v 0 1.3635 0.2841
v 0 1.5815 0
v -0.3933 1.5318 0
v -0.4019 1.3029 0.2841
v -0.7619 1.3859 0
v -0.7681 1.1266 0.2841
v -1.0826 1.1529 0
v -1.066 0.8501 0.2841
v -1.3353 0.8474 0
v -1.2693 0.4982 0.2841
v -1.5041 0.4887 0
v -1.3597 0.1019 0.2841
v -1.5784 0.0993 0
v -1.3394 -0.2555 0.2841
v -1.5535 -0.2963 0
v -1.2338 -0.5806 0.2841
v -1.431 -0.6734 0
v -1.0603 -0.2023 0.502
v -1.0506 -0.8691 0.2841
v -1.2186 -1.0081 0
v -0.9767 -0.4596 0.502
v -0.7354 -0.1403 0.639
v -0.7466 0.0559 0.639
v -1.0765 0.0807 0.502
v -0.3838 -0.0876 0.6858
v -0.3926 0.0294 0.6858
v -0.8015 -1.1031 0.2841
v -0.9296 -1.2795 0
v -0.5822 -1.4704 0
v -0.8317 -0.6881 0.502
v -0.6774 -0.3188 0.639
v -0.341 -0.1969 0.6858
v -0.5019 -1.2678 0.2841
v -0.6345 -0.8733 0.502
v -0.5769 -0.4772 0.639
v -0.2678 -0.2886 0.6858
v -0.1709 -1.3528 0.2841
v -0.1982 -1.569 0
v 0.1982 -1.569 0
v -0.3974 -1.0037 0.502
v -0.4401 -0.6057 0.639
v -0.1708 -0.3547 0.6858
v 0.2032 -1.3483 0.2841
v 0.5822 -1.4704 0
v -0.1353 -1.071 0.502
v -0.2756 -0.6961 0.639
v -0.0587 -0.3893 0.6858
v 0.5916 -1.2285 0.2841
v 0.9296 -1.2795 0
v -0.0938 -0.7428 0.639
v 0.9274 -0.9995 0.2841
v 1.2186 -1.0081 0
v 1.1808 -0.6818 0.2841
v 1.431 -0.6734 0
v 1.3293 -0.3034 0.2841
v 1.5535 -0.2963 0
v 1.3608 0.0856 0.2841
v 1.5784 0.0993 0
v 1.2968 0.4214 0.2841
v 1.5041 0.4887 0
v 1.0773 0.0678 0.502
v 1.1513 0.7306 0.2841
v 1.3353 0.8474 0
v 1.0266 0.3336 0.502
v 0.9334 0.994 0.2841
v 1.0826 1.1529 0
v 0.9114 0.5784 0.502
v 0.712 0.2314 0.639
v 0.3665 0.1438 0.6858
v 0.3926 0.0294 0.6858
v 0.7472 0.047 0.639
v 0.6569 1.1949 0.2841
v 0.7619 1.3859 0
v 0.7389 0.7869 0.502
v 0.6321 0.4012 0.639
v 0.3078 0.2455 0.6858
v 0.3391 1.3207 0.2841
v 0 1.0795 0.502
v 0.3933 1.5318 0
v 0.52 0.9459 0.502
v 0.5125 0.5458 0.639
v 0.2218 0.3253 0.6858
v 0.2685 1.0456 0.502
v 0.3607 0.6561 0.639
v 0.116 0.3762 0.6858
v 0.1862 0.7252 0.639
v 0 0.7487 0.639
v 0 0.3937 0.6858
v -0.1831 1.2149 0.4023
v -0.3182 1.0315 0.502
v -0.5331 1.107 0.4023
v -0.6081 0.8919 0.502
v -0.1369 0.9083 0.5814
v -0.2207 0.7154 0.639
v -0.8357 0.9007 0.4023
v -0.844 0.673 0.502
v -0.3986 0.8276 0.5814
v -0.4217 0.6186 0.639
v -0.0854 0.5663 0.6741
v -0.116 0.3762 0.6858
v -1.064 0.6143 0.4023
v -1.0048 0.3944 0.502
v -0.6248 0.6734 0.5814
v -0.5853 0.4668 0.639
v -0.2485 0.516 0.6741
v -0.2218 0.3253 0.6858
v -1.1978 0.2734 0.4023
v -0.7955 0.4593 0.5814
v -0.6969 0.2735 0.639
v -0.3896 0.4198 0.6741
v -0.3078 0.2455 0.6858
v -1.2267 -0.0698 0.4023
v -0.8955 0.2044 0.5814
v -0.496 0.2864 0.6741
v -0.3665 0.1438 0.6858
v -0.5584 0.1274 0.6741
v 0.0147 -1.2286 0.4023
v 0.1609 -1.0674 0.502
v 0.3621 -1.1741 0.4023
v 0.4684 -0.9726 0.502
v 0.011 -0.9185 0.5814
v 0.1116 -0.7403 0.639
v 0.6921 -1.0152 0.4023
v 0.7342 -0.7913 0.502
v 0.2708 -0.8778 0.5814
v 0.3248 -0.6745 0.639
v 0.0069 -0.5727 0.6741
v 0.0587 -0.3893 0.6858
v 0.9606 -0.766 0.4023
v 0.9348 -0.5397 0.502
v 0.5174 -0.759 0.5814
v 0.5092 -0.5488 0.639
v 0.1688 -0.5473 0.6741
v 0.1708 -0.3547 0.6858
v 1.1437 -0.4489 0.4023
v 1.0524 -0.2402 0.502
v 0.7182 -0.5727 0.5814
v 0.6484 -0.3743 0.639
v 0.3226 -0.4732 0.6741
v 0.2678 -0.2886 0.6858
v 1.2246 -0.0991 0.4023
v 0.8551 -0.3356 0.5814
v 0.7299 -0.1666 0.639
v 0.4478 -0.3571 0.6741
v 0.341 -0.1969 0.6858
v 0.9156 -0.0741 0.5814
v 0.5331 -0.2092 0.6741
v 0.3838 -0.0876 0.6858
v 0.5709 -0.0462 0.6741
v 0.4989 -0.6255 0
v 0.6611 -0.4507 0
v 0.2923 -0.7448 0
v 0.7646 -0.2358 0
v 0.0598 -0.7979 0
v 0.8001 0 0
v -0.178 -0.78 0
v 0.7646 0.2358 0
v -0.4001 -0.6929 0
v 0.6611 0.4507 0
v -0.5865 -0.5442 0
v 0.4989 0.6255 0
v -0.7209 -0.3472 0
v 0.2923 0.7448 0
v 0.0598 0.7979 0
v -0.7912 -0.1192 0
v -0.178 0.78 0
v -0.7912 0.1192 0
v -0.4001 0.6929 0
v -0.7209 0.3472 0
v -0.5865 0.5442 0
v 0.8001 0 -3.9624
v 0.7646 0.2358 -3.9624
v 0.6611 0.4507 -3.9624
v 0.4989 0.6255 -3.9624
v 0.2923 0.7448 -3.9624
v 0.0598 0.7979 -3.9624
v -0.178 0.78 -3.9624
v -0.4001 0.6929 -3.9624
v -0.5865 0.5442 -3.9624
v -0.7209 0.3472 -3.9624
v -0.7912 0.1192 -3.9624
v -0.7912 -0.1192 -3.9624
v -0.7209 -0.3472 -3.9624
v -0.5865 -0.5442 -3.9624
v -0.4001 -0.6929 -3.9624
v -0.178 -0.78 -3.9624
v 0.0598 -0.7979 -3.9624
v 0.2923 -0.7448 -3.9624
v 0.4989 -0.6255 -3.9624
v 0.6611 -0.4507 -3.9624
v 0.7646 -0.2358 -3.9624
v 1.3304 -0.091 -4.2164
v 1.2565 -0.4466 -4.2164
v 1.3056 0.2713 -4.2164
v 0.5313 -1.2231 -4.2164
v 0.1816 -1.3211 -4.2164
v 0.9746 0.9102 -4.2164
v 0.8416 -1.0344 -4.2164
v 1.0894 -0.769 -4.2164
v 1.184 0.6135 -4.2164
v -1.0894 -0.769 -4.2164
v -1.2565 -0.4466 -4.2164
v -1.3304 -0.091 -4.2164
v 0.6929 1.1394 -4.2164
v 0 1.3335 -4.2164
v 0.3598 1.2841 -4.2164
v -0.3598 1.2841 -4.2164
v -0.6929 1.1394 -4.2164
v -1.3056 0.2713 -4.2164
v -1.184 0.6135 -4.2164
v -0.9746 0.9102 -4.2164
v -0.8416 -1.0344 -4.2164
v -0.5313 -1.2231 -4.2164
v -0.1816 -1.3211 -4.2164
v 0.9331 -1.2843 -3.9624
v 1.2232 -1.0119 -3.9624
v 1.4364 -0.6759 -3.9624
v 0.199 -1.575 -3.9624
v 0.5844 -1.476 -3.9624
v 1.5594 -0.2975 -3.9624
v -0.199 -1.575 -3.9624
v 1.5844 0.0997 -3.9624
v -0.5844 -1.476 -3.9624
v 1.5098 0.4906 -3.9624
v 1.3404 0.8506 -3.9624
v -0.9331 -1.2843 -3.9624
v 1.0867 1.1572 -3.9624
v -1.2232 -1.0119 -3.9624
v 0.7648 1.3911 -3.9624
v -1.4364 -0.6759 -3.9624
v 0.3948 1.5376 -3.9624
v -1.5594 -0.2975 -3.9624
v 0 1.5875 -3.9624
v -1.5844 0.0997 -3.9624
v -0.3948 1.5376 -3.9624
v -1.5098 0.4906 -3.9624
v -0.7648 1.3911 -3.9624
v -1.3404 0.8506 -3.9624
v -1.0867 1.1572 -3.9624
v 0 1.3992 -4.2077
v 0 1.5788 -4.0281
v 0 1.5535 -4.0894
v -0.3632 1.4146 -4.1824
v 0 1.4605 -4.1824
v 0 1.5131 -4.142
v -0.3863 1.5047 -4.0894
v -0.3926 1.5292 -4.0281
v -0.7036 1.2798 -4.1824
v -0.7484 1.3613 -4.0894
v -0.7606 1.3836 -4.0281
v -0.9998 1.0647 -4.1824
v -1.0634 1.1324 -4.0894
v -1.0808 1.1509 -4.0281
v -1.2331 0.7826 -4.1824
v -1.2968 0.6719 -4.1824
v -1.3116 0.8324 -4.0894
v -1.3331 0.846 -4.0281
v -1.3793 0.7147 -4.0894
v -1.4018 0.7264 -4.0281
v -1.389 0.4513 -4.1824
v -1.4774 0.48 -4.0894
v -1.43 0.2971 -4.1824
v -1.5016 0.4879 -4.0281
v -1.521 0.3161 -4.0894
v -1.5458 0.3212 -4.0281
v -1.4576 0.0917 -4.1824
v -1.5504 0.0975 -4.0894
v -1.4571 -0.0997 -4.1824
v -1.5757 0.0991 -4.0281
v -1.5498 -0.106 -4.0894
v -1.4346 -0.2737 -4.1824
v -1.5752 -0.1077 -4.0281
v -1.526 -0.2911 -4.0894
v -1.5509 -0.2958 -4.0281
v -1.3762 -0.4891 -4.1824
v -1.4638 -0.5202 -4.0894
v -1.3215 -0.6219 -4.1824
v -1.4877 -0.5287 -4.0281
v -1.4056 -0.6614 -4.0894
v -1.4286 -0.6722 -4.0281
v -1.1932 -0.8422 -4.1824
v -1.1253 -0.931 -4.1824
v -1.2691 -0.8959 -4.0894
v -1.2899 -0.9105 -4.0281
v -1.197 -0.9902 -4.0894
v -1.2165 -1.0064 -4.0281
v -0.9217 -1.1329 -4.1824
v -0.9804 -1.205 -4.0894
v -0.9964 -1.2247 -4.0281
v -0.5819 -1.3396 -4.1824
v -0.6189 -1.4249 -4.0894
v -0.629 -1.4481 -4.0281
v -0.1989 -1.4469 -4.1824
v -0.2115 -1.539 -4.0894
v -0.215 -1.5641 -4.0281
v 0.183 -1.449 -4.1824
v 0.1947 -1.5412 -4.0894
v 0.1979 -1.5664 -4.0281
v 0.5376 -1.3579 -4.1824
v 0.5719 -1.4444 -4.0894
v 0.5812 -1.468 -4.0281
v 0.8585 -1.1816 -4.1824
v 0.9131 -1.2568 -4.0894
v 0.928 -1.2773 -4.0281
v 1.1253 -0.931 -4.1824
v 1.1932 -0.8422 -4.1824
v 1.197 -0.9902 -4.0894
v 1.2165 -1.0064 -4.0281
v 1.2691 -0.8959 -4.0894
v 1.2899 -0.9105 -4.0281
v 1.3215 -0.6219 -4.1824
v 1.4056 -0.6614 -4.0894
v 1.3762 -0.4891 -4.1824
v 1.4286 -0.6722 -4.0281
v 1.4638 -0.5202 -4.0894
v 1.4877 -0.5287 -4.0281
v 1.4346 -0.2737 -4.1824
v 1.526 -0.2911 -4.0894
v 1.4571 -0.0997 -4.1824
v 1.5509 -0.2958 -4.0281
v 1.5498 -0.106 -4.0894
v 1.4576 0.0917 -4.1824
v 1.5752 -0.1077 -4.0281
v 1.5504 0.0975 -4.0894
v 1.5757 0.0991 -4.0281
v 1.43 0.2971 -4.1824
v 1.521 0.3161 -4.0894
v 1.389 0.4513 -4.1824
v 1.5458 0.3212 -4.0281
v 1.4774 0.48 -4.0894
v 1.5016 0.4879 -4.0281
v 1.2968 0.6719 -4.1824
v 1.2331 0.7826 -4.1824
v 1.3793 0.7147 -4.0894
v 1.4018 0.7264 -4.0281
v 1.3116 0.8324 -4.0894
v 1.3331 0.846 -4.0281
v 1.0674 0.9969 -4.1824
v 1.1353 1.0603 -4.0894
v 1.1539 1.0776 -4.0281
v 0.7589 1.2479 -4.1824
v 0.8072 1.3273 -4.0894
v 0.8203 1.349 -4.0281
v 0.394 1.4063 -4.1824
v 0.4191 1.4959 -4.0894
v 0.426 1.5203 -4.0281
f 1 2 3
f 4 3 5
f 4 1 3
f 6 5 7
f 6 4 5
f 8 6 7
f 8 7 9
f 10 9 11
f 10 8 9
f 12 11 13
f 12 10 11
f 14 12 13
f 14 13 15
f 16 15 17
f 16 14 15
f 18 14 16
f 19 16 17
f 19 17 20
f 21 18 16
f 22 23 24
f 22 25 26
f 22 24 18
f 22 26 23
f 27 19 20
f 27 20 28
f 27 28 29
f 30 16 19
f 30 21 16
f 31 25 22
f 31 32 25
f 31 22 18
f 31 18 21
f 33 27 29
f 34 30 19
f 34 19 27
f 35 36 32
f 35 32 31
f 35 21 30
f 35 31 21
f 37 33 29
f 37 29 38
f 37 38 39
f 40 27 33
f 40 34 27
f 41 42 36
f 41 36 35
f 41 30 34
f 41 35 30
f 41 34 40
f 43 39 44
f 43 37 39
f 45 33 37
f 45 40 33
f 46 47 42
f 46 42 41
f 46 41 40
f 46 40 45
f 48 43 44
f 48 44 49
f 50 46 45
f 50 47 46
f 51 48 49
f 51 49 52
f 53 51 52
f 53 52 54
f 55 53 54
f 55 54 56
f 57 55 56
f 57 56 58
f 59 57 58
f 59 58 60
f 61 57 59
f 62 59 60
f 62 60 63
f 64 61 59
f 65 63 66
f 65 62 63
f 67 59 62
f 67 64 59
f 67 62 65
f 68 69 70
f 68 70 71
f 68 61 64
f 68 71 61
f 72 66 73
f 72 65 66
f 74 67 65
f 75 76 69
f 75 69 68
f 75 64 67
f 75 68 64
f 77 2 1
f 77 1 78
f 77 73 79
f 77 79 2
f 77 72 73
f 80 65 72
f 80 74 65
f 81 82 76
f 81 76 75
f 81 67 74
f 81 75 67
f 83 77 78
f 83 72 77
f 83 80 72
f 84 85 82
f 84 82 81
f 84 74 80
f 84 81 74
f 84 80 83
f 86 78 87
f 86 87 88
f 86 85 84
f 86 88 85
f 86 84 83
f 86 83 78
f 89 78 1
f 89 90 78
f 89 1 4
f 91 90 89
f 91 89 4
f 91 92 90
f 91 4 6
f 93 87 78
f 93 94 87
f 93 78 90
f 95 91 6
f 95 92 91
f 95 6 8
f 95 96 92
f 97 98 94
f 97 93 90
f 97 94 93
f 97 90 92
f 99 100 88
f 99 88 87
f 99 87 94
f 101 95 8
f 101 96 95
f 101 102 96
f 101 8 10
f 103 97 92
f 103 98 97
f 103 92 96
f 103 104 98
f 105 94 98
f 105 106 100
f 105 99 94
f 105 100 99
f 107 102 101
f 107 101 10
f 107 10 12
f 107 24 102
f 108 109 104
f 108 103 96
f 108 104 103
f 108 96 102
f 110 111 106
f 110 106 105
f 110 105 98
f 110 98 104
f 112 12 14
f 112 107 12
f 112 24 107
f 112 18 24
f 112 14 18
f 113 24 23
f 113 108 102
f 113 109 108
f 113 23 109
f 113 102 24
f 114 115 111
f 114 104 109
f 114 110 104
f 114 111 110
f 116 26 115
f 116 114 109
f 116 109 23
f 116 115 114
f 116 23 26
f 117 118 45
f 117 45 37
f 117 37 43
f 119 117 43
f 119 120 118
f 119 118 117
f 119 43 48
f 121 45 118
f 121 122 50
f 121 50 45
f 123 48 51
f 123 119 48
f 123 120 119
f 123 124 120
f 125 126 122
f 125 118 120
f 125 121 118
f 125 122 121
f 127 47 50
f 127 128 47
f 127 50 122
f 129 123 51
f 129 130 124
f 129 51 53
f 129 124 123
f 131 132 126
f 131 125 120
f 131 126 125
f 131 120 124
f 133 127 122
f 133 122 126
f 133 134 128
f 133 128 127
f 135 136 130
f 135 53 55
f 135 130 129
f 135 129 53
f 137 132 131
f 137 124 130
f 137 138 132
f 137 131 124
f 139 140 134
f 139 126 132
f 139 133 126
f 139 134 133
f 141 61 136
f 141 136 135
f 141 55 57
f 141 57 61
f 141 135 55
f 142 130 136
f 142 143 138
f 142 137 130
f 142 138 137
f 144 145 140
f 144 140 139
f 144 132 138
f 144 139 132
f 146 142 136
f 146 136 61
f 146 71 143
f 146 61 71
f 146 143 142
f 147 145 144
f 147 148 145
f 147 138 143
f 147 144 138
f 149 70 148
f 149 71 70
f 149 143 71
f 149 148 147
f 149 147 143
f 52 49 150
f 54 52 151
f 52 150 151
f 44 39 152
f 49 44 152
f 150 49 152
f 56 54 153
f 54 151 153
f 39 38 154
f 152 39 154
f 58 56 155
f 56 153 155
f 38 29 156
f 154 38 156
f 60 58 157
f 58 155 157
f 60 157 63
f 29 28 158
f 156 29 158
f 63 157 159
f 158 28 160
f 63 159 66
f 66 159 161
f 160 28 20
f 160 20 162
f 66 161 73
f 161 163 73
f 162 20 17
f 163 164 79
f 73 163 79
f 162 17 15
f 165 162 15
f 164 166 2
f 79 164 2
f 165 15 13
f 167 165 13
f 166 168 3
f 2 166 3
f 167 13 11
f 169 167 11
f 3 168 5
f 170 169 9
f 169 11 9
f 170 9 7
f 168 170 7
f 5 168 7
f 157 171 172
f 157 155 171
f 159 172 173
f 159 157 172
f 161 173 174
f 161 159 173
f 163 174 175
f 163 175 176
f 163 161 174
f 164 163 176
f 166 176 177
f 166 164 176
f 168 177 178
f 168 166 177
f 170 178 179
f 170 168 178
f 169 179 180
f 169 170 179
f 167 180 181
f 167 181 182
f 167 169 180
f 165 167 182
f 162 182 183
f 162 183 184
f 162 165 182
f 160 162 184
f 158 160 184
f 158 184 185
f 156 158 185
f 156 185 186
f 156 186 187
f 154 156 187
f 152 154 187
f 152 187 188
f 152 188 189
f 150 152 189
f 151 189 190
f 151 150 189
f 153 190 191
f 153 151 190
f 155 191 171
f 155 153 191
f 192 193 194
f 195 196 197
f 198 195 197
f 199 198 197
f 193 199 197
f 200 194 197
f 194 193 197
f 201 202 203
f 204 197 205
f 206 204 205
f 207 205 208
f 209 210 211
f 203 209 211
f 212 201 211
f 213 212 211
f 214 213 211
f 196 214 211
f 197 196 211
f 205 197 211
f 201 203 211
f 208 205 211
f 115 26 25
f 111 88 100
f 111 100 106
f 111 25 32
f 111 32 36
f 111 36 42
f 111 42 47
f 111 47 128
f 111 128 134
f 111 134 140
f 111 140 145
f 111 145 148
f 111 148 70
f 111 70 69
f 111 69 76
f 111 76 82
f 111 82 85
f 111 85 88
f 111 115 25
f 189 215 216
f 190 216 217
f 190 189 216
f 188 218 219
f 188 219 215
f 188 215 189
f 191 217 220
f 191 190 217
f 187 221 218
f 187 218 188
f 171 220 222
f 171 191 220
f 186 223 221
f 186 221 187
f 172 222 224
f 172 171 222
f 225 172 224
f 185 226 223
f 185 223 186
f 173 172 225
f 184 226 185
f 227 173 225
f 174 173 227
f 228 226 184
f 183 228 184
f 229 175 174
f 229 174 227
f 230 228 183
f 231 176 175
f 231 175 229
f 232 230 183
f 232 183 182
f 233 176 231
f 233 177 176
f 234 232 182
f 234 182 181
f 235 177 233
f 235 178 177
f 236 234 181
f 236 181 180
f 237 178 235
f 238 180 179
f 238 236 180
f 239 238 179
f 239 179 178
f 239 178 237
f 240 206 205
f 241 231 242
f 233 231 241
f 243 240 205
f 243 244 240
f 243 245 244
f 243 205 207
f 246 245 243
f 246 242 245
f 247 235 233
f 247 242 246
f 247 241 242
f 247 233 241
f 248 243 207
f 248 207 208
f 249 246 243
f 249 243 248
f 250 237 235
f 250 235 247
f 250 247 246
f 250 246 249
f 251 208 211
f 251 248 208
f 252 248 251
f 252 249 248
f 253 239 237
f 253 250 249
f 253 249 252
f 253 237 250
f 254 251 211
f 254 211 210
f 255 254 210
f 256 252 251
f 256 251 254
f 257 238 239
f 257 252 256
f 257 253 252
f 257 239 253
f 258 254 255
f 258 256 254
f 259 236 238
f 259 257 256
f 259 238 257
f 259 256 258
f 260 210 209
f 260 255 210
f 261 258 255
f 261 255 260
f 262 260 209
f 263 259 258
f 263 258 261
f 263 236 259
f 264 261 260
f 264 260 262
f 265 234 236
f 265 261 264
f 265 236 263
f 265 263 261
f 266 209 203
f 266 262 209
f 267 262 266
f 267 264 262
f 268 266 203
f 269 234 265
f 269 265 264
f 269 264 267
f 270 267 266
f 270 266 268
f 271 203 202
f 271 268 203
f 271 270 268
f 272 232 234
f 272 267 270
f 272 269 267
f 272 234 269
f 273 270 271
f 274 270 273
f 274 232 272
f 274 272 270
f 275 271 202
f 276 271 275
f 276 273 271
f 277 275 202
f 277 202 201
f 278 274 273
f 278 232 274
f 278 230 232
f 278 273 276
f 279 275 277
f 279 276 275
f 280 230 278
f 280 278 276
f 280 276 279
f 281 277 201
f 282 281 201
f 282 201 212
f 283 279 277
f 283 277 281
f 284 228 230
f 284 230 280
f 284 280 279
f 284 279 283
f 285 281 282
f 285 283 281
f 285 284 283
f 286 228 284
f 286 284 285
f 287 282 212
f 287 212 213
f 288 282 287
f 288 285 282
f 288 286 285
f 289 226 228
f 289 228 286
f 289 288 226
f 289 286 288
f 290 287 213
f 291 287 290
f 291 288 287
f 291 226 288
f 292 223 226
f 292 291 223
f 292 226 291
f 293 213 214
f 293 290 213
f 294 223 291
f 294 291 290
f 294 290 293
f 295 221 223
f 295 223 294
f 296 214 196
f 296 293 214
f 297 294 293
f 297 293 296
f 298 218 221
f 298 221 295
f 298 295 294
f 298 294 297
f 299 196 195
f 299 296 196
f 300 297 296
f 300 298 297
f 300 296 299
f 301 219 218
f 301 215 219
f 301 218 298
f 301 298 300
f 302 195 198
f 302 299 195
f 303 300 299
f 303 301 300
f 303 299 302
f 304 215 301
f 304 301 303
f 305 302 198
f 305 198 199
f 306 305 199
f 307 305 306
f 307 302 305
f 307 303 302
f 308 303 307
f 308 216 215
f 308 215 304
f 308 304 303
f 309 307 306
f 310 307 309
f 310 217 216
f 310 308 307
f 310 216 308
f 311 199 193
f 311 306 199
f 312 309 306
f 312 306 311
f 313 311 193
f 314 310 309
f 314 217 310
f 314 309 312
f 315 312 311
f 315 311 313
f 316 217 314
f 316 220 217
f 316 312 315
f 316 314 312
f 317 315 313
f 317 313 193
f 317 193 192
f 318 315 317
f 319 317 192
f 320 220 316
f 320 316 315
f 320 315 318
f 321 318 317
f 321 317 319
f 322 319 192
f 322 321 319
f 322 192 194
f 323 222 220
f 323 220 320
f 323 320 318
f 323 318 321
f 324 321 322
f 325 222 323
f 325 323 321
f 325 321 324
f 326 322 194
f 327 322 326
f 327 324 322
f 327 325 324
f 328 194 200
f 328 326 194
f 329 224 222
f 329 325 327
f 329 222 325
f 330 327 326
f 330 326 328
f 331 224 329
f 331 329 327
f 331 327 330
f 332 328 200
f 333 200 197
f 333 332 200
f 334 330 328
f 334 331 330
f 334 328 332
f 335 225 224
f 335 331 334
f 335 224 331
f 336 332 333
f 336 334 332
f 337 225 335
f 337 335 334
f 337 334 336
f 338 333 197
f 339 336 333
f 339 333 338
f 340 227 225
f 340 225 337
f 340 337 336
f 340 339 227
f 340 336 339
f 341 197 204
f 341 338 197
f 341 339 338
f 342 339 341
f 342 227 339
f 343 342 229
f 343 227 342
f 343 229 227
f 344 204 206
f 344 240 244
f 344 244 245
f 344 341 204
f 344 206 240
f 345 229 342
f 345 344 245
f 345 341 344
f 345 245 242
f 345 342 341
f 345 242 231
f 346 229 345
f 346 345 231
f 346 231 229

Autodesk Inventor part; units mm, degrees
ref_plane "YZ Plane" through (0, 0, 0) normal (1, 0, 0) x (0, 1, 0)
ref_plane "XZ Plane" through (0, 0, 0) normal (0, 1, 0) x (-1, 0, 0)
ref_plane "XY Plane" through (0, 0, 0) normal (0, 0, 1) x (1, 0, 0)
sketch "Sketch1" plane through (0, 0, 0) normal (0, 0, 1) x (1, 0, 0)
  circle A0 centre (0, 0) radius 0.8001
  dimension "d0" = 1.6002
extrude "Body" add sketch "Sketch1" against normal blind 3.9624
sketch "Sketch2" plane through (0, 0, 0) normal (1, 0, 0) x (0, 1, 0)
  line L0 (-0.328, 0) -> (1.9681, 0) construction
  line L1 (0, -6.8275) -> (0, -3.4849) construction
  line L2 (0, -3.9624) -> (1.5875, -3.9624)
  line L3 (1.5875, -3.9624) -> (1.5875, -3.9624)
  line L4 (1.3335, -4.2164) -> (0, -4.2164)
  line L5 (0, -4.2164) -> (0, -3.9624)
  arc A0 (1.3335, -4.2164) -> (1.5875, -3.9624) centre (1.3335, -3.9624) ccw
  point P0 (1.5875, -4.2164)
  point P1 (0, -6.35)
  dimension "d3" = 3.9624
  dimension "d4" = 3.175
  dimension "d5" = 0.254
  dimension "d6" = 0.254
  dimension "d11" = 6.35
revolve "Deformation" add sketch "Sketch2" angle 360 about axis through (0, 0, -10) along (0, 0, 1)
sketch "Sketch4" plane through (0, 0, 0) normal (1, 0, 0) x (0, 1, 0)
  line L0 (-0.3175, 0) -> (1.905, 0) construction
  line L1 (0, -4.7549) -> (0, 0.7925) projected
  line L2 (0, 0) -> (1.5875, 0)
  line L3 (1.5875, 0) -> (1.5875, -0.1016)
  line L4 (1.5875, -0.1016) -> (0.8001, -0.7623)
  line L5 (0.8001, -0.7623) -> (0, -0.7623)
  line L6 (0.8001, 0) -> (0.8001, -3.9624) construction
  dimension "d12" = 3.175
  dimension "d13" = 0.1016
  dimension "d14" = 50
  dimension "d22" = 0.6607
revolve "CSink Head" [suppressed]
sketch "Sketch5" plane through (0, 0, 0) normal (1, 0, 0) x (0, 1, 0)
  line L0 (0, -0.9919) -> (0, 1.1511) projected
  line L1 (-0.3347, 0) -> (2.0081, 0) construction
  line L2 (0, 0.6858) -> (0.3937, 0.6858)
  arc A0 (1.5815, 0) -> (0.3937, 0.6858) centre (0.3937, -0.6858) ccw
  line L3 (1.5815, 0) -> (0, 0)
  dimension "d16" = 0.7874
  dimension "d17" = 1.3716
  dimension "d18" = 0.3937
  dimension "d19" = 0.6858
revolve "Universal Head" add sketch "Sketch5" angle 360 about axis through (0, 0, -10) along (0, 0, 1)
equation "\"d0\" = Dim_D"
equation "\"d1\" = Engage_Length"
equation "\"d3\" = Engage_Length"
equation "\"d4\" = Dim_A"
equation "\"d5\" = 0.5 * Dim_T"
equation "\"d6\" = d5"
equation "\"d11\" = Length"
equation "\"d12\" = Dim_A"
equation "\"d13\" = Dim_E_CSink"
equation "\"d16\" = Dim_E_Univ"
equation "\"d17\" = Dim_R"
equation "\"d19\" = Dim_C"
equation "\"Dim_A\" = 3.175"
equation "\"Dim_B\" = 2.3876"
equation "\"Dim_C_CSink\" = Dim_B"
equation "\"Dim_D\" = 1.6002"
equation "\"Dim_E_CSink\" = 0.1016"
equation "\"Dim_S\" = 0.5842"
equation "\"Dim_T\" = 0.508"
equation "\"Engage_Length\" = Length - Dim_C_CSink"
equation "\"Length\" = 6.35"
equation "\"Dim_E_Univ\" = 0.7874"
equation "\"Dim_F\" = 0.5842"
equation "\"Dim_R\" = 1.3716"
equation "\"Dim_C\" = 0.6858"
properties part number "MS20470 A 2-4" material "Aluminum-6061"
